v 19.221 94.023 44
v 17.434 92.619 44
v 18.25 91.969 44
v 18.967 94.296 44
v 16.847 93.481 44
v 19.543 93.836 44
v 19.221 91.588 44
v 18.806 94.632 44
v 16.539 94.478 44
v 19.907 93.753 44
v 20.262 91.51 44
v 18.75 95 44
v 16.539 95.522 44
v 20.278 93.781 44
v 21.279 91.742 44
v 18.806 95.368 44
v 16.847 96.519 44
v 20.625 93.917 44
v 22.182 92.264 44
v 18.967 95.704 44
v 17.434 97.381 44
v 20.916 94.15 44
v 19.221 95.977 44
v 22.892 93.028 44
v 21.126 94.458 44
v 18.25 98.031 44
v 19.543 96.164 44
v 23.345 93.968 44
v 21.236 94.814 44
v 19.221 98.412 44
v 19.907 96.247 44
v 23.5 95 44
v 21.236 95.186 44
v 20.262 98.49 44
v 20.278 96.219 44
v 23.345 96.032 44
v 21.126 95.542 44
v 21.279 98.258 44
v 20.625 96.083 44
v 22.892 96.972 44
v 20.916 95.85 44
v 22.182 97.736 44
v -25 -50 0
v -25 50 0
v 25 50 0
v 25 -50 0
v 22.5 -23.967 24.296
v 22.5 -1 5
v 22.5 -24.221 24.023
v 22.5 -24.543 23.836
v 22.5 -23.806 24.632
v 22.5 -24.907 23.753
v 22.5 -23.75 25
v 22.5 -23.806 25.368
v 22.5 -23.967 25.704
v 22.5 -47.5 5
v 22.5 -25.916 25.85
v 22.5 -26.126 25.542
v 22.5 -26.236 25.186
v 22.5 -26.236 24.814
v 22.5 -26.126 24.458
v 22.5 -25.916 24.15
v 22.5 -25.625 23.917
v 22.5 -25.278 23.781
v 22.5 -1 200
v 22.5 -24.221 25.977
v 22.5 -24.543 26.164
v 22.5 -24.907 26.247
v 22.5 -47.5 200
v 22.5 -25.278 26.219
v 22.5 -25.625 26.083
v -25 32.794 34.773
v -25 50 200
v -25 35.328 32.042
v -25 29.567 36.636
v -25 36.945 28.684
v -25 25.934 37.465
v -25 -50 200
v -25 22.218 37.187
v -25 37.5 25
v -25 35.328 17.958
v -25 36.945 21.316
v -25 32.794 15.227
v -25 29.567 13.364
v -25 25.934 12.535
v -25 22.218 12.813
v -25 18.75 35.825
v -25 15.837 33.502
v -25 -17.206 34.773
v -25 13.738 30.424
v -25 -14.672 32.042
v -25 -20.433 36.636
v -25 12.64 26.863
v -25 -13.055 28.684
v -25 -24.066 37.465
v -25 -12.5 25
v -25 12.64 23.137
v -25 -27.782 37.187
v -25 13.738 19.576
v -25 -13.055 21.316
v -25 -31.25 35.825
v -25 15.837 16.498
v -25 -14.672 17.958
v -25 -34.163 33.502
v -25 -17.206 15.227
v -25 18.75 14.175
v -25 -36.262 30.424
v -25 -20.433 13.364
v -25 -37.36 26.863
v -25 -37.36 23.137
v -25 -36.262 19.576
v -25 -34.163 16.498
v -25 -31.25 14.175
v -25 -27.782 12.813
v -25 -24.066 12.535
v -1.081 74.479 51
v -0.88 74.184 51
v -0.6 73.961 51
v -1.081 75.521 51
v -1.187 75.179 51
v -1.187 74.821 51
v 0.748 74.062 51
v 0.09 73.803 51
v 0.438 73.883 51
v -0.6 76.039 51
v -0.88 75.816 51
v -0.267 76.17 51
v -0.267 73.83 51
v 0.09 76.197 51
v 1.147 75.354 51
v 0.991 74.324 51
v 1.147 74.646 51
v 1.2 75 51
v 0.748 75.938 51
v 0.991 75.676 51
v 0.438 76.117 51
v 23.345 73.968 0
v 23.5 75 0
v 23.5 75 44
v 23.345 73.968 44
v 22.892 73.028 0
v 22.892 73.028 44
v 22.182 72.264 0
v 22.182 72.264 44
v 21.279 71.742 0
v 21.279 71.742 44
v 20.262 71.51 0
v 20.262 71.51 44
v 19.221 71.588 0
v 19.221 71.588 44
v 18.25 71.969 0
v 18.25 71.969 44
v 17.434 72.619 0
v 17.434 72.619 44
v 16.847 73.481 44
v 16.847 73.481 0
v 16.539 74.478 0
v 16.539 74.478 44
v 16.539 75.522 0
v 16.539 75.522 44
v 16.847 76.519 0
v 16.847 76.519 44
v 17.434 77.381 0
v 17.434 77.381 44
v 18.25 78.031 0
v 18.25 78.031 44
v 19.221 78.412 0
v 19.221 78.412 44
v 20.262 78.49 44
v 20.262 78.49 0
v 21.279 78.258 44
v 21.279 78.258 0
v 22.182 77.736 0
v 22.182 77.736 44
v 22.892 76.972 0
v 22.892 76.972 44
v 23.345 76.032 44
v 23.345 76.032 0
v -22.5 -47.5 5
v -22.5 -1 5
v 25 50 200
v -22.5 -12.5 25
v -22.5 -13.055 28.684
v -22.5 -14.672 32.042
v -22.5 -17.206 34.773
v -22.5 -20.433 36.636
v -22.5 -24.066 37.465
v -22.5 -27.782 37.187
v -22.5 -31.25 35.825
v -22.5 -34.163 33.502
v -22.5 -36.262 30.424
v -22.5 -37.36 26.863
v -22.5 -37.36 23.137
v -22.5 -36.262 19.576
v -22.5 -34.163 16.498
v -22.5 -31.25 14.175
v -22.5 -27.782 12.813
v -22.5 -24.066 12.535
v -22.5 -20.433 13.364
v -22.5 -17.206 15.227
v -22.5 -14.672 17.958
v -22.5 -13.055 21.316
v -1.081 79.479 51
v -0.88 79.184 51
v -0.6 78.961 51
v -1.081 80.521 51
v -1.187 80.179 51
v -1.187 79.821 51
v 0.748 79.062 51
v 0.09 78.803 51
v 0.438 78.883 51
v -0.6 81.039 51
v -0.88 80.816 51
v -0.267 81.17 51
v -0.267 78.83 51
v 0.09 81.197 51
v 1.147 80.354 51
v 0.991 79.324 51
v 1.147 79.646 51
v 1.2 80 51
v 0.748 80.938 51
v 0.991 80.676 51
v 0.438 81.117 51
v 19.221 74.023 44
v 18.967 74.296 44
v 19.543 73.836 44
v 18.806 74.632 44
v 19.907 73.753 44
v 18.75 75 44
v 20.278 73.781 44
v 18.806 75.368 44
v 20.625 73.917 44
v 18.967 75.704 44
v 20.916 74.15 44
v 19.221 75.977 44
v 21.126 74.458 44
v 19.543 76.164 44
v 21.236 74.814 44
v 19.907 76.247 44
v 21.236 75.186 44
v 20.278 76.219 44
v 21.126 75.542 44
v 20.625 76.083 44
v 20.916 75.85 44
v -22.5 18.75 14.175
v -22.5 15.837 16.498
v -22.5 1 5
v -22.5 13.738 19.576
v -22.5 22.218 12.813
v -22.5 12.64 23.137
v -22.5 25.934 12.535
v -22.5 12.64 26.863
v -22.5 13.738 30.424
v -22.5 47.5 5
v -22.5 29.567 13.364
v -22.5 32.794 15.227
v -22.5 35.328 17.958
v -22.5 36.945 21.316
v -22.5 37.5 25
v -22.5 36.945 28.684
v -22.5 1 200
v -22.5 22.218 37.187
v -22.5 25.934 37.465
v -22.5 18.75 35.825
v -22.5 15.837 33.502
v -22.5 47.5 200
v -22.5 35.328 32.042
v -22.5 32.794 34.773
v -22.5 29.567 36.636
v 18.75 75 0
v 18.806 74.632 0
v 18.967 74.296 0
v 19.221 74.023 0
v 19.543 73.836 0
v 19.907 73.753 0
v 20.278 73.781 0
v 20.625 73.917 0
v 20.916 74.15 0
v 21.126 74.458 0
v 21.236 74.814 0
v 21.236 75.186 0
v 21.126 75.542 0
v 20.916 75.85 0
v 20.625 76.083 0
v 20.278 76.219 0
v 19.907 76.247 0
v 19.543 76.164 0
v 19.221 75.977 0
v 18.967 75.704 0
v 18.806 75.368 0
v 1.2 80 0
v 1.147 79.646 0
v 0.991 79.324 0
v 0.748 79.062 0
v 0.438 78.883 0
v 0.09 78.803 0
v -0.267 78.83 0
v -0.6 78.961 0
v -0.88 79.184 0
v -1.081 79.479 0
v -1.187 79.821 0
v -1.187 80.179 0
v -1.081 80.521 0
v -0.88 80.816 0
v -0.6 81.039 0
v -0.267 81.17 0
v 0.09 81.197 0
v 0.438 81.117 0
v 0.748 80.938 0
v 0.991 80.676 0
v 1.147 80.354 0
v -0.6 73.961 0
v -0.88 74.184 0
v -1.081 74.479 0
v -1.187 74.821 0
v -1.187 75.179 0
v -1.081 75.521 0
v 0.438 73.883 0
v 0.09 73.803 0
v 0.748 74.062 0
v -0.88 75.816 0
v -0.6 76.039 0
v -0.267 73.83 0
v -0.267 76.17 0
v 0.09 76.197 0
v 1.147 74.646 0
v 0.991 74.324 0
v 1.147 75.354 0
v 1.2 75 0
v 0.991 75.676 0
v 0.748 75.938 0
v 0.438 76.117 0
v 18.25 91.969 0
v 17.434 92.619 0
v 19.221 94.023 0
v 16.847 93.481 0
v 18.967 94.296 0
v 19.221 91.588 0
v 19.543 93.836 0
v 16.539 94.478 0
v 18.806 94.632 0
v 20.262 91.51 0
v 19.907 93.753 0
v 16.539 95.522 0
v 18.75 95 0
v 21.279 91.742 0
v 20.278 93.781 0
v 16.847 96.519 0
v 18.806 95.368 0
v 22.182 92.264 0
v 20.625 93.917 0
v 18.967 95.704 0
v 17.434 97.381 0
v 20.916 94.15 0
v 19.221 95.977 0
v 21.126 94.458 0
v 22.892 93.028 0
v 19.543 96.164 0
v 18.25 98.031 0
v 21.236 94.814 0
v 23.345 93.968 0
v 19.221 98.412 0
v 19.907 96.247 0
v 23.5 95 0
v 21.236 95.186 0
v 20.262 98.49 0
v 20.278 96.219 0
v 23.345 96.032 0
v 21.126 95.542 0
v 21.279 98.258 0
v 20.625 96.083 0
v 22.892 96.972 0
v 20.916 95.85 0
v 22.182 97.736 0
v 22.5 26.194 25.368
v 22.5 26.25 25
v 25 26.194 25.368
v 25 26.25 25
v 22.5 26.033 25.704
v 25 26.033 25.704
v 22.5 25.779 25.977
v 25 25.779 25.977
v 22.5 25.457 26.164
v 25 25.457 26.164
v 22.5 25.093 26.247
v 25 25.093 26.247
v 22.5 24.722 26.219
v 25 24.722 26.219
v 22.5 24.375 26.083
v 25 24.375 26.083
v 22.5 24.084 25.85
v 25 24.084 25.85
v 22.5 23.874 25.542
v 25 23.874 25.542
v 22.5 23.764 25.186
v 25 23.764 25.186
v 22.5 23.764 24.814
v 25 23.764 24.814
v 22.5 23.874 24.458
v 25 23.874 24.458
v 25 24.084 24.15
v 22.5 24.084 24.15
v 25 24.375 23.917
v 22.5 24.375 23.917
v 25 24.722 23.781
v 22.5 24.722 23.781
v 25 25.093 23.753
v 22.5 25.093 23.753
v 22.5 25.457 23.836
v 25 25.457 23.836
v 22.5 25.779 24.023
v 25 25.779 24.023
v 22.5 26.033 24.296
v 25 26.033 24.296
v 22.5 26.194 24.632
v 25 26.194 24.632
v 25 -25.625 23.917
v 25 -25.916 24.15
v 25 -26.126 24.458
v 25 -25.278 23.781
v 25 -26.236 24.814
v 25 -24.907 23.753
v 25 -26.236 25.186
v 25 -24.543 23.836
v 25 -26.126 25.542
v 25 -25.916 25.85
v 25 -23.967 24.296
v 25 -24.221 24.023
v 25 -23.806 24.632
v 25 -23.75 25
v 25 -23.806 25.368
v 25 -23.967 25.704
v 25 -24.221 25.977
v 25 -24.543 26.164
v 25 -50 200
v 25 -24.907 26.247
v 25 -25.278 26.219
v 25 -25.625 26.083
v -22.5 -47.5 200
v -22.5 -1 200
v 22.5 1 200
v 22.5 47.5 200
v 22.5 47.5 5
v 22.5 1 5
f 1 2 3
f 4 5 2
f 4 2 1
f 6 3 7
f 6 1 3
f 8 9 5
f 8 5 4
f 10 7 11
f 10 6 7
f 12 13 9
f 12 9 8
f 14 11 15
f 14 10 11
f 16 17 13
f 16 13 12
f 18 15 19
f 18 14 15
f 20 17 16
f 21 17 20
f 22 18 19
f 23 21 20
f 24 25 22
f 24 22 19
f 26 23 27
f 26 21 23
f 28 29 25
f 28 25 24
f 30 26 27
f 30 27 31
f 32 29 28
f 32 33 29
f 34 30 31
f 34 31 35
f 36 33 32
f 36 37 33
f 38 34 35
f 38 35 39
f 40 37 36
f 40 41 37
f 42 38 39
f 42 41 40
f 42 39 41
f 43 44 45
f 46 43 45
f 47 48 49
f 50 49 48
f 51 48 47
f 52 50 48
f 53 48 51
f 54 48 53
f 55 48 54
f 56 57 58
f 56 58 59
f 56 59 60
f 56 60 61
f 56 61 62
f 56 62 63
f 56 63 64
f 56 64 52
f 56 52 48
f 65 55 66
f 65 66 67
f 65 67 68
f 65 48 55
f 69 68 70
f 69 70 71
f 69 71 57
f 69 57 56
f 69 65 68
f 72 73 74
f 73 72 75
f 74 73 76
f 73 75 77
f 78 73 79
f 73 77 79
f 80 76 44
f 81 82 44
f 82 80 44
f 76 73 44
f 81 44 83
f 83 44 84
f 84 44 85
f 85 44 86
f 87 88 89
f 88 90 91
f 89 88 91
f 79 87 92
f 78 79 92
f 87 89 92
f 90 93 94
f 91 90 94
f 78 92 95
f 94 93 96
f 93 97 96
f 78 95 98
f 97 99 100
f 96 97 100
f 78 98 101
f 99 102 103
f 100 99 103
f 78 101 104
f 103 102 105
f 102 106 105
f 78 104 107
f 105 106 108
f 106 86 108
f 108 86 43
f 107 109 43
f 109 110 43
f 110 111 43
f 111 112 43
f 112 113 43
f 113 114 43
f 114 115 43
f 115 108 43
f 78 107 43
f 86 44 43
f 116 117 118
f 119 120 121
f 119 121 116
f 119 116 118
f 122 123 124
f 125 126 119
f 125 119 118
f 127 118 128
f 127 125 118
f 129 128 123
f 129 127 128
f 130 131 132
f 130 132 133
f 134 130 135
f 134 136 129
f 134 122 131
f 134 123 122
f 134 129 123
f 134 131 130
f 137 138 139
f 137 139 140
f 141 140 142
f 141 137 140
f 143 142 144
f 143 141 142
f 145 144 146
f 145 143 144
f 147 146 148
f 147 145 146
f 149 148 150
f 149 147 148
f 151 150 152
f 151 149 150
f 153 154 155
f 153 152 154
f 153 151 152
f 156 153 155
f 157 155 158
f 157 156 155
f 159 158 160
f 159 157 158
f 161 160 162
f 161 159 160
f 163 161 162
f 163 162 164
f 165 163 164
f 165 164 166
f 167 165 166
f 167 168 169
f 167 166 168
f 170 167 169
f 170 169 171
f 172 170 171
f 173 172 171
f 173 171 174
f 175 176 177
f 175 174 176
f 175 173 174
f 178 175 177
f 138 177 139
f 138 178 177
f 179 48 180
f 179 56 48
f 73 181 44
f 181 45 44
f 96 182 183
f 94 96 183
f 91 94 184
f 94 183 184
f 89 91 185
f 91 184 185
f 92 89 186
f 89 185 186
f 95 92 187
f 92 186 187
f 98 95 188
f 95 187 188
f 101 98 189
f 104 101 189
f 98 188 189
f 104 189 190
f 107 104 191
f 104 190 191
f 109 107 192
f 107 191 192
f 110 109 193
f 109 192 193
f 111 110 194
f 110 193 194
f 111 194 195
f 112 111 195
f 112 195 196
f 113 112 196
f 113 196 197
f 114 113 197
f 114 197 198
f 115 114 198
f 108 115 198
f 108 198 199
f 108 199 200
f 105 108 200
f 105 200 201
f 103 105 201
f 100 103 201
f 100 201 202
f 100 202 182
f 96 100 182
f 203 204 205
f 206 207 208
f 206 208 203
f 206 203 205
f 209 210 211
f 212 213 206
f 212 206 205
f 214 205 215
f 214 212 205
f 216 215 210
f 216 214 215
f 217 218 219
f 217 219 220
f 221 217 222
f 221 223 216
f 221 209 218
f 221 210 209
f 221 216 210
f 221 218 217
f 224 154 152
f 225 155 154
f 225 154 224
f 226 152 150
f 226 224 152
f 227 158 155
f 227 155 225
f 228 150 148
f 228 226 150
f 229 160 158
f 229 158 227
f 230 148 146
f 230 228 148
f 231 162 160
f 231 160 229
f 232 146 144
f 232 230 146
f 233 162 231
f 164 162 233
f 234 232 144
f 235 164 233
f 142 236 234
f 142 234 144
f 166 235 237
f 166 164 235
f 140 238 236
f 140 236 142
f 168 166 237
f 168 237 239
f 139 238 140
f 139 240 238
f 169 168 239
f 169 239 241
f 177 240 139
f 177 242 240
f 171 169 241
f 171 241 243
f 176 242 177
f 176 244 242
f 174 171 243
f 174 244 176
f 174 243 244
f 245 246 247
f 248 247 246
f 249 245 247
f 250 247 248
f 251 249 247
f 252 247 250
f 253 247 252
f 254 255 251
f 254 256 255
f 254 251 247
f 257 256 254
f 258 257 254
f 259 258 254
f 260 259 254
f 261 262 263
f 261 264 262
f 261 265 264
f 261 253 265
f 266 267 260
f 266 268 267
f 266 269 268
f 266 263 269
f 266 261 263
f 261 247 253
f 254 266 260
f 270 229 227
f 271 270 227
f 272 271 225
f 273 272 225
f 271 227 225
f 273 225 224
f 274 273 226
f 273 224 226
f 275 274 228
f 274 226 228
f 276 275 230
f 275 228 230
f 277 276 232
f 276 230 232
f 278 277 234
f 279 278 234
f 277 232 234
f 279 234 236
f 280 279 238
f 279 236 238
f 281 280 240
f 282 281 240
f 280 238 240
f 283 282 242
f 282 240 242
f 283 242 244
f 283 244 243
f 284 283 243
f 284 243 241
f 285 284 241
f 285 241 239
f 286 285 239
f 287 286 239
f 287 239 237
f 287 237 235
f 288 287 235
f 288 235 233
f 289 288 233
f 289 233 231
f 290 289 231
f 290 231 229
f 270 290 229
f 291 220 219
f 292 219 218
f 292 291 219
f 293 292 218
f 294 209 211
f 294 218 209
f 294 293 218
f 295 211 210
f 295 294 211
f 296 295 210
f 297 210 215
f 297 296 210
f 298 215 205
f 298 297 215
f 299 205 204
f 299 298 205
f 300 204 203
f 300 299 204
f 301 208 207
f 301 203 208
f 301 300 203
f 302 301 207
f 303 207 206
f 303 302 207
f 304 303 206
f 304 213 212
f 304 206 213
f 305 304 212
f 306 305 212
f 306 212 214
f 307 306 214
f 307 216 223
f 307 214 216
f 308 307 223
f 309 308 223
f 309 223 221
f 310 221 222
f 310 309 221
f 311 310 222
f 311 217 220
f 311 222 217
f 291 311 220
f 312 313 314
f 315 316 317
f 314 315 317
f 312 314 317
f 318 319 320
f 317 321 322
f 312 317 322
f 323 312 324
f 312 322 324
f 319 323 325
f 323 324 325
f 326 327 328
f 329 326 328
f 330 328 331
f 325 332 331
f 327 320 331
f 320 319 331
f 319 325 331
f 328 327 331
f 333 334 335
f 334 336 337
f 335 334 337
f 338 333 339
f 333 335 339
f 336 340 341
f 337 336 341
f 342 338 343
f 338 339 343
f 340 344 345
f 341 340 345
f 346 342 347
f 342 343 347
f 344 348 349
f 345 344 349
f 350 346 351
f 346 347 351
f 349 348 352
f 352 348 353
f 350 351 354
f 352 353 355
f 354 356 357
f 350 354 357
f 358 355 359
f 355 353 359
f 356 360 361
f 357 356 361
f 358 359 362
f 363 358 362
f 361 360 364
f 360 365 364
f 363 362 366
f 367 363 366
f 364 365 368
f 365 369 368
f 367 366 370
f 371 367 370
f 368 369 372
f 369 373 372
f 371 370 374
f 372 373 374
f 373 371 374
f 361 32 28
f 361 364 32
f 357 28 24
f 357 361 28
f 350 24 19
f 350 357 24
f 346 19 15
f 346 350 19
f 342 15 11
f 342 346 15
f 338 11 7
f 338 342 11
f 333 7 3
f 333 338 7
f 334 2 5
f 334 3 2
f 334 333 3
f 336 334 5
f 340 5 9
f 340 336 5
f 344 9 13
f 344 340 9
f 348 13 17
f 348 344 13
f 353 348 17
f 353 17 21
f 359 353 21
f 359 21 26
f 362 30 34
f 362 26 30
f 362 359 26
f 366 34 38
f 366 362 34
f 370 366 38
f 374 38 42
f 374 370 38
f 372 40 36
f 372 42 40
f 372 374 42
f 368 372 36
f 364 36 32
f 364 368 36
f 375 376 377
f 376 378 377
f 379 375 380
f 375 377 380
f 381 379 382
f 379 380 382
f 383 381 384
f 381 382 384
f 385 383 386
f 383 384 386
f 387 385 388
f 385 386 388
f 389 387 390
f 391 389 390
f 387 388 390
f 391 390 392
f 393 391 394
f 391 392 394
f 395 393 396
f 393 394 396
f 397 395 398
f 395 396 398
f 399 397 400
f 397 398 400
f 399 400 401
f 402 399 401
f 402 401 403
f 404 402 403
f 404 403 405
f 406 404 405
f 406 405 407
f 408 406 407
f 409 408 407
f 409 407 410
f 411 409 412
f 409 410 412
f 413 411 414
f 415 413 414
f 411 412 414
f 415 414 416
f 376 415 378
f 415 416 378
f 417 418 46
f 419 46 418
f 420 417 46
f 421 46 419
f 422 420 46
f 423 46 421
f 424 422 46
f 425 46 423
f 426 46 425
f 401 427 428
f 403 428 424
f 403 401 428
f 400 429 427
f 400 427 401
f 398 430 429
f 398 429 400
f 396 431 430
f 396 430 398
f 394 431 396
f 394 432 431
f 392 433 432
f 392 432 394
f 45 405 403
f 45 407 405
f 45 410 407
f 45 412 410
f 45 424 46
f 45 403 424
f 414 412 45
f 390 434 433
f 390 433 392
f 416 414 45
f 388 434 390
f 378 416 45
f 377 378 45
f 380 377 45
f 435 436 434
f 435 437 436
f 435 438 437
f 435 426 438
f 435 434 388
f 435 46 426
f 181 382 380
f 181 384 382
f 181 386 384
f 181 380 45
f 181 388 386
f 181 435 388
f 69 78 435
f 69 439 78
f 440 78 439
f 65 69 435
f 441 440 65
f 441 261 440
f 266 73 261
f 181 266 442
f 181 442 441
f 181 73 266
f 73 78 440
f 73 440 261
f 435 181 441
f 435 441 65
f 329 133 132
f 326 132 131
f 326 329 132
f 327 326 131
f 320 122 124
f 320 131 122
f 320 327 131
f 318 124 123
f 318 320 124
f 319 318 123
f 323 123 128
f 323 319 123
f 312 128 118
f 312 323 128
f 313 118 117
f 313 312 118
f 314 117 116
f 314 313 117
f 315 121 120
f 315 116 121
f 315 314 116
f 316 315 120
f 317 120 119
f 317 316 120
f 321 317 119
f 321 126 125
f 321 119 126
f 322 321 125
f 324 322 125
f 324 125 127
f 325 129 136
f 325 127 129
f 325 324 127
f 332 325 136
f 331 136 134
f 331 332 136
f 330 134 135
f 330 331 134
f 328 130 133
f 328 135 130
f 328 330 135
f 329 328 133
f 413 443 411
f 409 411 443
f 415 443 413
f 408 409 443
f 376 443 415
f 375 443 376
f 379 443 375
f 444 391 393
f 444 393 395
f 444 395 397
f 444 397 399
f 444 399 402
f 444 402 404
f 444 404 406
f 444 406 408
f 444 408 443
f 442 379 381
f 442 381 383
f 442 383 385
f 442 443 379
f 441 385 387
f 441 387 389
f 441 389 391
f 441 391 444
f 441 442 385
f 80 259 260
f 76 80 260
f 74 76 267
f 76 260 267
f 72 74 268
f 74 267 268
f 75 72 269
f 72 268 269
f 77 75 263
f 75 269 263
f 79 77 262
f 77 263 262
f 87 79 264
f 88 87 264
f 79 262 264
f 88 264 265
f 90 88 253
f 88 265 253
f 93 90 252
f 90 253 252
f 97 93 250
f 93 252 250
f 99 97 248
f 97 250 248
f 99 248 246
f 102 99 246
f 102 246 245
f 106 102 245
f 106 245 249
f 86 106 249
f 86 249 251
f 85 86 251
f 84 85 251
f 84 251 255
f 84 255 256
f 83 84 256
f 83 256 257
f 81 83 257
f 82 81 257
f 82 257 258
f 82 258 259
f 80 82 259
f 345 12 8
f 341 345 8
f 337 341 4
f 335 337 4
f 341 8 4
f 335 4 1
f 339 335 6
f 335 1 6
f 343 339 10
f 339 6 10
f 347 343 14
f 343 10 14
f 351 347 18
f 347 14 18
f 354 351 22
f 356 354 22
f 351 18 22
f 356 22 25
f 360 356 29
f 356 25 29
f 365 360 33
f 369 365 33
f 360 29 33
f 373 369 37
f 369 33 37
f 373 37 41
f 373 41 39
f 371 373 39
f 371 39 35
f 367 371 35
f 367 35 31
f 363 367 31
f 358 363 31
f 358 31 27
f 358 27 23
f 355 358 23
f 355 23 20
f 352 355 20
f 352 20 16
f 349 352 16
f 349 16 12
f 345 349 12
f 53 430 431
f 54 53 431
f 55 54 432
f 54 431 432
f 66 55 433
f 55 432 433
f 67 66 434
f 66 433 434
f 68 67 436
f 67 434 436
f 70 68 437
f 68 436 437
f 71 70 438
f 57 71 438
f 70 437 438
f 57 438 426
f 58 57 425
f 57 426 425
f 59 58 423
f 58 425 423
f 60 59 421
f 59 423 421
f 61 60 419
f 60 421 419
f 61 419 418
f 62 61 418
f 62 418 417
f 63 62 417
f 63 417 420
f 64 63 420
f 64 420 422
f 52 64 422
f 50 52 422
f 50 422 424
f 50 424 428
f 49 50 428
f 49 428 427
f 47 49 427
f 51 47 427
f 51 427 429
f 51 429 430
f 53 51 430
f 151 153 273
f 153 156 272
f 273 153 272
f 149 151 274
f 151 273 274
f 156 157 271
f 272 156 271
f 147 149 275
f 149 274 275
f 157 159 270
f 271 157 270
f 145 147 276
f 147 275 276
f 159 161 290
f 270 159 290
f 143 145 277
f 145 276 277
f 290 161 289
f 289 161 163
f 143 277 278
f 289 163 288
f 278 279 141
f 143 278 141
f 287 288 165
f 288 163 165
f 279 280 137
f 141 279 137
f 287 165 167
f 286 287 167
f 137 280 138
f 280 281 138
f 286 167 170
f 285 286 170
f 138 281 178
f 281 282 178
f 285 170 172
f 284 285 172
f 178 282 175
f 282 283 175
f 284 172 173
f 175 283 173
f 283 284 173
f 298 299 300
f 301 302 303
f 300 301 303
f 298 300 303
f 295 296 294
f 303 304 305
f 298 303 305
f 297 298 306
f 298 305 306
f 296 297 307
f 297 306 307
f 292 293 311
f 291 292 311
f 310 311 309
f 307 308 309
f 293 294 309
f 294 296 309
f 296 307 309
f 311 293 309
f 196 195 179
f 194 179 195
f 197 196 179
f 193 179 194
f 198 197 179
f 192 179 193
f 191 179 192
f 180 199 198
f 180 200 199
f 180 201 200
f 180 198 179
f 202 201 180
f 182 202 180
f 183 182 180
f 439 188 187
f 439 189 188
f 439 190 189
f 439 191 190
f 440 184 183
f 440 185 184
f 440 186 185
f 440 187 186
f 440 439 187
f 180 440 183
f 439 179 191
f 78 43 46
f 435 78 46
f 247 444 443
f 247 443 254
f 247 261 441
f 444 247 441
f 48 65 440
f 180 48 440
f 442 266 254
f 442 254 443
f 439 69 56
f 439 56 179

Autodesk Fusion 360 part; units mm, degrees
sketch "Sketch1" plane through (0, 0, 0) normal (0, 0, 1) x (1, 0, 0)
  line L0 (25, 50) -> (-25, 50)
  line L1 (-25, 50) -> (-25, -50)
  line L2 (-25, -50) -> (25, -50)
  line L3 (25, -50) -> (25, 50)
  line L4 (25, 50) -> (-25, -50) construction
  line L5 (-25, 50) -> (25, -50) construction
  dimension "d1" = 100
extrude "Extrude1" add sketch "Sketch1" along normal blind 200 makes body 1
sketch "Sketch2" plane through (25, 0, 0) normal (1, 0, 0) x (0, 1, 0)
  line L0 (-50, 0) -> (50, 0)
  line L1 (50, 0) -> (50, 200)
  line L2 (50, 200) -> (-50, 200)
  line L3 (-50, 200) -> (-50, 0)
  circle A0 centre (-25, 25) radius 12.5
  circle A1 centre (25, 25) radius 12.5
  dimension "d4" = 25
  dimension "d5" = 25
extrude "Extrude2" cut sketch "Sketch2" against normal blind 280 contours A1 bodies 1
extrude "Extrude3" cut sketch "Sketch2" against normal blind 155 contours A0 bodies 1
sketch "Sketch3" plane through (0, 0, 200) normal (0, 0, 1) x (-1, 0, 0)
  line L0 (-25, 50) -> (-25, -50)
  line L1 (-25, -50) -> (25, -50)
  line L2 (25, -50) -> (25, 50)
  line L3 (25, 50) -> (-25, 50)
  line L4 (22.5, -47.5) -> (-22.5, -47.5)
  line L5 (-22.5, -47.5) -> (-22.5, 47.5)
  line L6 (-22.5, 47.5) -> (22.5, 47.5)
  line L7 (22.5, 47.5) -> (22.5, -47.5)
extrude "Extrude4" cut sketch "Sketch3" against normal blind 195 contours L4 L5 L6 L7 bodies 1
sketch "Sketch4" plane through (0, 0, 200) normal (0, 0, 1) x (-1, 0, 0)
  line L0 (-22.5, -47.5) -> (-22.5, 47.5)
  line L1 (-22.5, 47.5) -> (22.5, 47.5)
  line L2 (22.5, 47.5) -> (22.5, -47.5)
  line L3 (22.5, -47.5) -> (-22.5, -47.5)
  line L4 (-25, 50) -> (-25, -50)
  line L5 (-25, -50) -> (25, -50)
  line L6 (25, -50) -> (25, 50)
  line L7 (25, 50) -> (-25, 50)
  line L8 (22.5, -1) -> (-22.5, -1)
  line L9 (-22.5, -1) -> (-22.5, 1)
  line L10 (-22.5, 1) -> (22.5, 1)
  line L11 (22.5, 1) -> (22.5, -1)
extrude "Extrude5" add sketch "Sketch4" against normal blind 195 contours L0 L2 L8 L9 L10 L11 bodies 1
sketch "Sketch5" plane through (0, 0, 200) normal (0, 0, 1) x (-1, 0, 0)
  line L0 (-22.5, 1) -> (-22.5, 47.5)
  line L1 (-22.5, 47.5) -> (22.5, 47.5)
  line L2 (22.5, 47.5) -> (22.5, 1)
  line L3 (22.5, 1) -> (-22.5, 1)
  line L4 (-22.5, -1) -> (22.5, -1)
  line L5 (22.5, -1) -> (22.5, -47.5)
  line L6 (22.5, -47.5) -> (-22.5, -47.5)
  line L7 (-22.5, -47.5) -> (-22.5, -1)
  line L8 (-25, 50) -> (-25, -50)
  line L9 (-25, -50) -> (25, -50)
  line L10 (25, -50) -> (25, 50)
  line L11 (25, 50) -> (-25, 50)
extrude "Extrude6" add sketch "Sketch2" against normal blind 2.5 contours A0 bodies 1
extrude "Extrude7" add sketch "Sketch2" against normal blind 2.5 contours A1 bodies 1
sketch "Sketch6" plane through (25, 0, 0) normal (1, 0, 0) x (0, 1, 0)
  circle A0 centre (-25, 25) radius 1.25
  circle A1 centre (25, 25) radius 1.25
  dimension "d18" = 2.5
  dimension "d19" = 2.5
extrude "Extrude8" cut sketch "Sketch6" against normal blind 5 contours A0 bodies 1
extrude "Extrude9" cut sketch "Sketch6" against normal blind 4 contours A1 bodies 1
sketch "Sketch7" plane through (0, 0, 0) normal (0, 0, 1) x (1, 0, 0)
  circle A0 centre (0, 75) radius 1.2
  dimension "d24" = 2.4
extrude "Extrude10" add sketch "Sketch7" along normal blind 51 separate body makes body 2
sketch "Sketch8" plane through (0, 0, 0) normal (0, 0, 1) x (1, 0, 0)
  circle A0 centre (0, 80) radius 1.2
  dimension "d27" = 2.4
extrude "Extrude11" add sketch "Sketch8" along normal blind 51 separate body makes body 3
sketch "Sketch9" plane through (0, 0, 0) normal (0, 0, 1) x (1, 0, 0)
  circle A0 centre (20, 75) radius 3.5
  circle A1 centre (20, 95) radius 3.5
  dimension "d30" = 7
  dimension "d31" = 7
extrude "Extrude12" add sketch "Sketch9" along normal blind 44 separate body contours A1 makes body 4
extrude "Extrude13" add sketch "Sketch9" along normal blind 44 separate body contours A0 makes body 5
sketch "Sketch10" plane through (0, 0, 44) normal (0, 0, 1) x (-1, 0, 0)
  circle A0 centre (-20, -75) radius 3.5
  circle A1 centre (-20, -75) radius 1.25
  circle A2 centre (-20, -95) radius 1.25
  dimension "d36" = 2.5
  dimension "d37" = 2.5
extrude "Extrude14" cut sketch "Sketch10" against normal blind 102222222 contours A1 bodies 5
extrude "Extrude15" cut sketch "Sketch10" against normal blind 100 contours A2 bodies 4
